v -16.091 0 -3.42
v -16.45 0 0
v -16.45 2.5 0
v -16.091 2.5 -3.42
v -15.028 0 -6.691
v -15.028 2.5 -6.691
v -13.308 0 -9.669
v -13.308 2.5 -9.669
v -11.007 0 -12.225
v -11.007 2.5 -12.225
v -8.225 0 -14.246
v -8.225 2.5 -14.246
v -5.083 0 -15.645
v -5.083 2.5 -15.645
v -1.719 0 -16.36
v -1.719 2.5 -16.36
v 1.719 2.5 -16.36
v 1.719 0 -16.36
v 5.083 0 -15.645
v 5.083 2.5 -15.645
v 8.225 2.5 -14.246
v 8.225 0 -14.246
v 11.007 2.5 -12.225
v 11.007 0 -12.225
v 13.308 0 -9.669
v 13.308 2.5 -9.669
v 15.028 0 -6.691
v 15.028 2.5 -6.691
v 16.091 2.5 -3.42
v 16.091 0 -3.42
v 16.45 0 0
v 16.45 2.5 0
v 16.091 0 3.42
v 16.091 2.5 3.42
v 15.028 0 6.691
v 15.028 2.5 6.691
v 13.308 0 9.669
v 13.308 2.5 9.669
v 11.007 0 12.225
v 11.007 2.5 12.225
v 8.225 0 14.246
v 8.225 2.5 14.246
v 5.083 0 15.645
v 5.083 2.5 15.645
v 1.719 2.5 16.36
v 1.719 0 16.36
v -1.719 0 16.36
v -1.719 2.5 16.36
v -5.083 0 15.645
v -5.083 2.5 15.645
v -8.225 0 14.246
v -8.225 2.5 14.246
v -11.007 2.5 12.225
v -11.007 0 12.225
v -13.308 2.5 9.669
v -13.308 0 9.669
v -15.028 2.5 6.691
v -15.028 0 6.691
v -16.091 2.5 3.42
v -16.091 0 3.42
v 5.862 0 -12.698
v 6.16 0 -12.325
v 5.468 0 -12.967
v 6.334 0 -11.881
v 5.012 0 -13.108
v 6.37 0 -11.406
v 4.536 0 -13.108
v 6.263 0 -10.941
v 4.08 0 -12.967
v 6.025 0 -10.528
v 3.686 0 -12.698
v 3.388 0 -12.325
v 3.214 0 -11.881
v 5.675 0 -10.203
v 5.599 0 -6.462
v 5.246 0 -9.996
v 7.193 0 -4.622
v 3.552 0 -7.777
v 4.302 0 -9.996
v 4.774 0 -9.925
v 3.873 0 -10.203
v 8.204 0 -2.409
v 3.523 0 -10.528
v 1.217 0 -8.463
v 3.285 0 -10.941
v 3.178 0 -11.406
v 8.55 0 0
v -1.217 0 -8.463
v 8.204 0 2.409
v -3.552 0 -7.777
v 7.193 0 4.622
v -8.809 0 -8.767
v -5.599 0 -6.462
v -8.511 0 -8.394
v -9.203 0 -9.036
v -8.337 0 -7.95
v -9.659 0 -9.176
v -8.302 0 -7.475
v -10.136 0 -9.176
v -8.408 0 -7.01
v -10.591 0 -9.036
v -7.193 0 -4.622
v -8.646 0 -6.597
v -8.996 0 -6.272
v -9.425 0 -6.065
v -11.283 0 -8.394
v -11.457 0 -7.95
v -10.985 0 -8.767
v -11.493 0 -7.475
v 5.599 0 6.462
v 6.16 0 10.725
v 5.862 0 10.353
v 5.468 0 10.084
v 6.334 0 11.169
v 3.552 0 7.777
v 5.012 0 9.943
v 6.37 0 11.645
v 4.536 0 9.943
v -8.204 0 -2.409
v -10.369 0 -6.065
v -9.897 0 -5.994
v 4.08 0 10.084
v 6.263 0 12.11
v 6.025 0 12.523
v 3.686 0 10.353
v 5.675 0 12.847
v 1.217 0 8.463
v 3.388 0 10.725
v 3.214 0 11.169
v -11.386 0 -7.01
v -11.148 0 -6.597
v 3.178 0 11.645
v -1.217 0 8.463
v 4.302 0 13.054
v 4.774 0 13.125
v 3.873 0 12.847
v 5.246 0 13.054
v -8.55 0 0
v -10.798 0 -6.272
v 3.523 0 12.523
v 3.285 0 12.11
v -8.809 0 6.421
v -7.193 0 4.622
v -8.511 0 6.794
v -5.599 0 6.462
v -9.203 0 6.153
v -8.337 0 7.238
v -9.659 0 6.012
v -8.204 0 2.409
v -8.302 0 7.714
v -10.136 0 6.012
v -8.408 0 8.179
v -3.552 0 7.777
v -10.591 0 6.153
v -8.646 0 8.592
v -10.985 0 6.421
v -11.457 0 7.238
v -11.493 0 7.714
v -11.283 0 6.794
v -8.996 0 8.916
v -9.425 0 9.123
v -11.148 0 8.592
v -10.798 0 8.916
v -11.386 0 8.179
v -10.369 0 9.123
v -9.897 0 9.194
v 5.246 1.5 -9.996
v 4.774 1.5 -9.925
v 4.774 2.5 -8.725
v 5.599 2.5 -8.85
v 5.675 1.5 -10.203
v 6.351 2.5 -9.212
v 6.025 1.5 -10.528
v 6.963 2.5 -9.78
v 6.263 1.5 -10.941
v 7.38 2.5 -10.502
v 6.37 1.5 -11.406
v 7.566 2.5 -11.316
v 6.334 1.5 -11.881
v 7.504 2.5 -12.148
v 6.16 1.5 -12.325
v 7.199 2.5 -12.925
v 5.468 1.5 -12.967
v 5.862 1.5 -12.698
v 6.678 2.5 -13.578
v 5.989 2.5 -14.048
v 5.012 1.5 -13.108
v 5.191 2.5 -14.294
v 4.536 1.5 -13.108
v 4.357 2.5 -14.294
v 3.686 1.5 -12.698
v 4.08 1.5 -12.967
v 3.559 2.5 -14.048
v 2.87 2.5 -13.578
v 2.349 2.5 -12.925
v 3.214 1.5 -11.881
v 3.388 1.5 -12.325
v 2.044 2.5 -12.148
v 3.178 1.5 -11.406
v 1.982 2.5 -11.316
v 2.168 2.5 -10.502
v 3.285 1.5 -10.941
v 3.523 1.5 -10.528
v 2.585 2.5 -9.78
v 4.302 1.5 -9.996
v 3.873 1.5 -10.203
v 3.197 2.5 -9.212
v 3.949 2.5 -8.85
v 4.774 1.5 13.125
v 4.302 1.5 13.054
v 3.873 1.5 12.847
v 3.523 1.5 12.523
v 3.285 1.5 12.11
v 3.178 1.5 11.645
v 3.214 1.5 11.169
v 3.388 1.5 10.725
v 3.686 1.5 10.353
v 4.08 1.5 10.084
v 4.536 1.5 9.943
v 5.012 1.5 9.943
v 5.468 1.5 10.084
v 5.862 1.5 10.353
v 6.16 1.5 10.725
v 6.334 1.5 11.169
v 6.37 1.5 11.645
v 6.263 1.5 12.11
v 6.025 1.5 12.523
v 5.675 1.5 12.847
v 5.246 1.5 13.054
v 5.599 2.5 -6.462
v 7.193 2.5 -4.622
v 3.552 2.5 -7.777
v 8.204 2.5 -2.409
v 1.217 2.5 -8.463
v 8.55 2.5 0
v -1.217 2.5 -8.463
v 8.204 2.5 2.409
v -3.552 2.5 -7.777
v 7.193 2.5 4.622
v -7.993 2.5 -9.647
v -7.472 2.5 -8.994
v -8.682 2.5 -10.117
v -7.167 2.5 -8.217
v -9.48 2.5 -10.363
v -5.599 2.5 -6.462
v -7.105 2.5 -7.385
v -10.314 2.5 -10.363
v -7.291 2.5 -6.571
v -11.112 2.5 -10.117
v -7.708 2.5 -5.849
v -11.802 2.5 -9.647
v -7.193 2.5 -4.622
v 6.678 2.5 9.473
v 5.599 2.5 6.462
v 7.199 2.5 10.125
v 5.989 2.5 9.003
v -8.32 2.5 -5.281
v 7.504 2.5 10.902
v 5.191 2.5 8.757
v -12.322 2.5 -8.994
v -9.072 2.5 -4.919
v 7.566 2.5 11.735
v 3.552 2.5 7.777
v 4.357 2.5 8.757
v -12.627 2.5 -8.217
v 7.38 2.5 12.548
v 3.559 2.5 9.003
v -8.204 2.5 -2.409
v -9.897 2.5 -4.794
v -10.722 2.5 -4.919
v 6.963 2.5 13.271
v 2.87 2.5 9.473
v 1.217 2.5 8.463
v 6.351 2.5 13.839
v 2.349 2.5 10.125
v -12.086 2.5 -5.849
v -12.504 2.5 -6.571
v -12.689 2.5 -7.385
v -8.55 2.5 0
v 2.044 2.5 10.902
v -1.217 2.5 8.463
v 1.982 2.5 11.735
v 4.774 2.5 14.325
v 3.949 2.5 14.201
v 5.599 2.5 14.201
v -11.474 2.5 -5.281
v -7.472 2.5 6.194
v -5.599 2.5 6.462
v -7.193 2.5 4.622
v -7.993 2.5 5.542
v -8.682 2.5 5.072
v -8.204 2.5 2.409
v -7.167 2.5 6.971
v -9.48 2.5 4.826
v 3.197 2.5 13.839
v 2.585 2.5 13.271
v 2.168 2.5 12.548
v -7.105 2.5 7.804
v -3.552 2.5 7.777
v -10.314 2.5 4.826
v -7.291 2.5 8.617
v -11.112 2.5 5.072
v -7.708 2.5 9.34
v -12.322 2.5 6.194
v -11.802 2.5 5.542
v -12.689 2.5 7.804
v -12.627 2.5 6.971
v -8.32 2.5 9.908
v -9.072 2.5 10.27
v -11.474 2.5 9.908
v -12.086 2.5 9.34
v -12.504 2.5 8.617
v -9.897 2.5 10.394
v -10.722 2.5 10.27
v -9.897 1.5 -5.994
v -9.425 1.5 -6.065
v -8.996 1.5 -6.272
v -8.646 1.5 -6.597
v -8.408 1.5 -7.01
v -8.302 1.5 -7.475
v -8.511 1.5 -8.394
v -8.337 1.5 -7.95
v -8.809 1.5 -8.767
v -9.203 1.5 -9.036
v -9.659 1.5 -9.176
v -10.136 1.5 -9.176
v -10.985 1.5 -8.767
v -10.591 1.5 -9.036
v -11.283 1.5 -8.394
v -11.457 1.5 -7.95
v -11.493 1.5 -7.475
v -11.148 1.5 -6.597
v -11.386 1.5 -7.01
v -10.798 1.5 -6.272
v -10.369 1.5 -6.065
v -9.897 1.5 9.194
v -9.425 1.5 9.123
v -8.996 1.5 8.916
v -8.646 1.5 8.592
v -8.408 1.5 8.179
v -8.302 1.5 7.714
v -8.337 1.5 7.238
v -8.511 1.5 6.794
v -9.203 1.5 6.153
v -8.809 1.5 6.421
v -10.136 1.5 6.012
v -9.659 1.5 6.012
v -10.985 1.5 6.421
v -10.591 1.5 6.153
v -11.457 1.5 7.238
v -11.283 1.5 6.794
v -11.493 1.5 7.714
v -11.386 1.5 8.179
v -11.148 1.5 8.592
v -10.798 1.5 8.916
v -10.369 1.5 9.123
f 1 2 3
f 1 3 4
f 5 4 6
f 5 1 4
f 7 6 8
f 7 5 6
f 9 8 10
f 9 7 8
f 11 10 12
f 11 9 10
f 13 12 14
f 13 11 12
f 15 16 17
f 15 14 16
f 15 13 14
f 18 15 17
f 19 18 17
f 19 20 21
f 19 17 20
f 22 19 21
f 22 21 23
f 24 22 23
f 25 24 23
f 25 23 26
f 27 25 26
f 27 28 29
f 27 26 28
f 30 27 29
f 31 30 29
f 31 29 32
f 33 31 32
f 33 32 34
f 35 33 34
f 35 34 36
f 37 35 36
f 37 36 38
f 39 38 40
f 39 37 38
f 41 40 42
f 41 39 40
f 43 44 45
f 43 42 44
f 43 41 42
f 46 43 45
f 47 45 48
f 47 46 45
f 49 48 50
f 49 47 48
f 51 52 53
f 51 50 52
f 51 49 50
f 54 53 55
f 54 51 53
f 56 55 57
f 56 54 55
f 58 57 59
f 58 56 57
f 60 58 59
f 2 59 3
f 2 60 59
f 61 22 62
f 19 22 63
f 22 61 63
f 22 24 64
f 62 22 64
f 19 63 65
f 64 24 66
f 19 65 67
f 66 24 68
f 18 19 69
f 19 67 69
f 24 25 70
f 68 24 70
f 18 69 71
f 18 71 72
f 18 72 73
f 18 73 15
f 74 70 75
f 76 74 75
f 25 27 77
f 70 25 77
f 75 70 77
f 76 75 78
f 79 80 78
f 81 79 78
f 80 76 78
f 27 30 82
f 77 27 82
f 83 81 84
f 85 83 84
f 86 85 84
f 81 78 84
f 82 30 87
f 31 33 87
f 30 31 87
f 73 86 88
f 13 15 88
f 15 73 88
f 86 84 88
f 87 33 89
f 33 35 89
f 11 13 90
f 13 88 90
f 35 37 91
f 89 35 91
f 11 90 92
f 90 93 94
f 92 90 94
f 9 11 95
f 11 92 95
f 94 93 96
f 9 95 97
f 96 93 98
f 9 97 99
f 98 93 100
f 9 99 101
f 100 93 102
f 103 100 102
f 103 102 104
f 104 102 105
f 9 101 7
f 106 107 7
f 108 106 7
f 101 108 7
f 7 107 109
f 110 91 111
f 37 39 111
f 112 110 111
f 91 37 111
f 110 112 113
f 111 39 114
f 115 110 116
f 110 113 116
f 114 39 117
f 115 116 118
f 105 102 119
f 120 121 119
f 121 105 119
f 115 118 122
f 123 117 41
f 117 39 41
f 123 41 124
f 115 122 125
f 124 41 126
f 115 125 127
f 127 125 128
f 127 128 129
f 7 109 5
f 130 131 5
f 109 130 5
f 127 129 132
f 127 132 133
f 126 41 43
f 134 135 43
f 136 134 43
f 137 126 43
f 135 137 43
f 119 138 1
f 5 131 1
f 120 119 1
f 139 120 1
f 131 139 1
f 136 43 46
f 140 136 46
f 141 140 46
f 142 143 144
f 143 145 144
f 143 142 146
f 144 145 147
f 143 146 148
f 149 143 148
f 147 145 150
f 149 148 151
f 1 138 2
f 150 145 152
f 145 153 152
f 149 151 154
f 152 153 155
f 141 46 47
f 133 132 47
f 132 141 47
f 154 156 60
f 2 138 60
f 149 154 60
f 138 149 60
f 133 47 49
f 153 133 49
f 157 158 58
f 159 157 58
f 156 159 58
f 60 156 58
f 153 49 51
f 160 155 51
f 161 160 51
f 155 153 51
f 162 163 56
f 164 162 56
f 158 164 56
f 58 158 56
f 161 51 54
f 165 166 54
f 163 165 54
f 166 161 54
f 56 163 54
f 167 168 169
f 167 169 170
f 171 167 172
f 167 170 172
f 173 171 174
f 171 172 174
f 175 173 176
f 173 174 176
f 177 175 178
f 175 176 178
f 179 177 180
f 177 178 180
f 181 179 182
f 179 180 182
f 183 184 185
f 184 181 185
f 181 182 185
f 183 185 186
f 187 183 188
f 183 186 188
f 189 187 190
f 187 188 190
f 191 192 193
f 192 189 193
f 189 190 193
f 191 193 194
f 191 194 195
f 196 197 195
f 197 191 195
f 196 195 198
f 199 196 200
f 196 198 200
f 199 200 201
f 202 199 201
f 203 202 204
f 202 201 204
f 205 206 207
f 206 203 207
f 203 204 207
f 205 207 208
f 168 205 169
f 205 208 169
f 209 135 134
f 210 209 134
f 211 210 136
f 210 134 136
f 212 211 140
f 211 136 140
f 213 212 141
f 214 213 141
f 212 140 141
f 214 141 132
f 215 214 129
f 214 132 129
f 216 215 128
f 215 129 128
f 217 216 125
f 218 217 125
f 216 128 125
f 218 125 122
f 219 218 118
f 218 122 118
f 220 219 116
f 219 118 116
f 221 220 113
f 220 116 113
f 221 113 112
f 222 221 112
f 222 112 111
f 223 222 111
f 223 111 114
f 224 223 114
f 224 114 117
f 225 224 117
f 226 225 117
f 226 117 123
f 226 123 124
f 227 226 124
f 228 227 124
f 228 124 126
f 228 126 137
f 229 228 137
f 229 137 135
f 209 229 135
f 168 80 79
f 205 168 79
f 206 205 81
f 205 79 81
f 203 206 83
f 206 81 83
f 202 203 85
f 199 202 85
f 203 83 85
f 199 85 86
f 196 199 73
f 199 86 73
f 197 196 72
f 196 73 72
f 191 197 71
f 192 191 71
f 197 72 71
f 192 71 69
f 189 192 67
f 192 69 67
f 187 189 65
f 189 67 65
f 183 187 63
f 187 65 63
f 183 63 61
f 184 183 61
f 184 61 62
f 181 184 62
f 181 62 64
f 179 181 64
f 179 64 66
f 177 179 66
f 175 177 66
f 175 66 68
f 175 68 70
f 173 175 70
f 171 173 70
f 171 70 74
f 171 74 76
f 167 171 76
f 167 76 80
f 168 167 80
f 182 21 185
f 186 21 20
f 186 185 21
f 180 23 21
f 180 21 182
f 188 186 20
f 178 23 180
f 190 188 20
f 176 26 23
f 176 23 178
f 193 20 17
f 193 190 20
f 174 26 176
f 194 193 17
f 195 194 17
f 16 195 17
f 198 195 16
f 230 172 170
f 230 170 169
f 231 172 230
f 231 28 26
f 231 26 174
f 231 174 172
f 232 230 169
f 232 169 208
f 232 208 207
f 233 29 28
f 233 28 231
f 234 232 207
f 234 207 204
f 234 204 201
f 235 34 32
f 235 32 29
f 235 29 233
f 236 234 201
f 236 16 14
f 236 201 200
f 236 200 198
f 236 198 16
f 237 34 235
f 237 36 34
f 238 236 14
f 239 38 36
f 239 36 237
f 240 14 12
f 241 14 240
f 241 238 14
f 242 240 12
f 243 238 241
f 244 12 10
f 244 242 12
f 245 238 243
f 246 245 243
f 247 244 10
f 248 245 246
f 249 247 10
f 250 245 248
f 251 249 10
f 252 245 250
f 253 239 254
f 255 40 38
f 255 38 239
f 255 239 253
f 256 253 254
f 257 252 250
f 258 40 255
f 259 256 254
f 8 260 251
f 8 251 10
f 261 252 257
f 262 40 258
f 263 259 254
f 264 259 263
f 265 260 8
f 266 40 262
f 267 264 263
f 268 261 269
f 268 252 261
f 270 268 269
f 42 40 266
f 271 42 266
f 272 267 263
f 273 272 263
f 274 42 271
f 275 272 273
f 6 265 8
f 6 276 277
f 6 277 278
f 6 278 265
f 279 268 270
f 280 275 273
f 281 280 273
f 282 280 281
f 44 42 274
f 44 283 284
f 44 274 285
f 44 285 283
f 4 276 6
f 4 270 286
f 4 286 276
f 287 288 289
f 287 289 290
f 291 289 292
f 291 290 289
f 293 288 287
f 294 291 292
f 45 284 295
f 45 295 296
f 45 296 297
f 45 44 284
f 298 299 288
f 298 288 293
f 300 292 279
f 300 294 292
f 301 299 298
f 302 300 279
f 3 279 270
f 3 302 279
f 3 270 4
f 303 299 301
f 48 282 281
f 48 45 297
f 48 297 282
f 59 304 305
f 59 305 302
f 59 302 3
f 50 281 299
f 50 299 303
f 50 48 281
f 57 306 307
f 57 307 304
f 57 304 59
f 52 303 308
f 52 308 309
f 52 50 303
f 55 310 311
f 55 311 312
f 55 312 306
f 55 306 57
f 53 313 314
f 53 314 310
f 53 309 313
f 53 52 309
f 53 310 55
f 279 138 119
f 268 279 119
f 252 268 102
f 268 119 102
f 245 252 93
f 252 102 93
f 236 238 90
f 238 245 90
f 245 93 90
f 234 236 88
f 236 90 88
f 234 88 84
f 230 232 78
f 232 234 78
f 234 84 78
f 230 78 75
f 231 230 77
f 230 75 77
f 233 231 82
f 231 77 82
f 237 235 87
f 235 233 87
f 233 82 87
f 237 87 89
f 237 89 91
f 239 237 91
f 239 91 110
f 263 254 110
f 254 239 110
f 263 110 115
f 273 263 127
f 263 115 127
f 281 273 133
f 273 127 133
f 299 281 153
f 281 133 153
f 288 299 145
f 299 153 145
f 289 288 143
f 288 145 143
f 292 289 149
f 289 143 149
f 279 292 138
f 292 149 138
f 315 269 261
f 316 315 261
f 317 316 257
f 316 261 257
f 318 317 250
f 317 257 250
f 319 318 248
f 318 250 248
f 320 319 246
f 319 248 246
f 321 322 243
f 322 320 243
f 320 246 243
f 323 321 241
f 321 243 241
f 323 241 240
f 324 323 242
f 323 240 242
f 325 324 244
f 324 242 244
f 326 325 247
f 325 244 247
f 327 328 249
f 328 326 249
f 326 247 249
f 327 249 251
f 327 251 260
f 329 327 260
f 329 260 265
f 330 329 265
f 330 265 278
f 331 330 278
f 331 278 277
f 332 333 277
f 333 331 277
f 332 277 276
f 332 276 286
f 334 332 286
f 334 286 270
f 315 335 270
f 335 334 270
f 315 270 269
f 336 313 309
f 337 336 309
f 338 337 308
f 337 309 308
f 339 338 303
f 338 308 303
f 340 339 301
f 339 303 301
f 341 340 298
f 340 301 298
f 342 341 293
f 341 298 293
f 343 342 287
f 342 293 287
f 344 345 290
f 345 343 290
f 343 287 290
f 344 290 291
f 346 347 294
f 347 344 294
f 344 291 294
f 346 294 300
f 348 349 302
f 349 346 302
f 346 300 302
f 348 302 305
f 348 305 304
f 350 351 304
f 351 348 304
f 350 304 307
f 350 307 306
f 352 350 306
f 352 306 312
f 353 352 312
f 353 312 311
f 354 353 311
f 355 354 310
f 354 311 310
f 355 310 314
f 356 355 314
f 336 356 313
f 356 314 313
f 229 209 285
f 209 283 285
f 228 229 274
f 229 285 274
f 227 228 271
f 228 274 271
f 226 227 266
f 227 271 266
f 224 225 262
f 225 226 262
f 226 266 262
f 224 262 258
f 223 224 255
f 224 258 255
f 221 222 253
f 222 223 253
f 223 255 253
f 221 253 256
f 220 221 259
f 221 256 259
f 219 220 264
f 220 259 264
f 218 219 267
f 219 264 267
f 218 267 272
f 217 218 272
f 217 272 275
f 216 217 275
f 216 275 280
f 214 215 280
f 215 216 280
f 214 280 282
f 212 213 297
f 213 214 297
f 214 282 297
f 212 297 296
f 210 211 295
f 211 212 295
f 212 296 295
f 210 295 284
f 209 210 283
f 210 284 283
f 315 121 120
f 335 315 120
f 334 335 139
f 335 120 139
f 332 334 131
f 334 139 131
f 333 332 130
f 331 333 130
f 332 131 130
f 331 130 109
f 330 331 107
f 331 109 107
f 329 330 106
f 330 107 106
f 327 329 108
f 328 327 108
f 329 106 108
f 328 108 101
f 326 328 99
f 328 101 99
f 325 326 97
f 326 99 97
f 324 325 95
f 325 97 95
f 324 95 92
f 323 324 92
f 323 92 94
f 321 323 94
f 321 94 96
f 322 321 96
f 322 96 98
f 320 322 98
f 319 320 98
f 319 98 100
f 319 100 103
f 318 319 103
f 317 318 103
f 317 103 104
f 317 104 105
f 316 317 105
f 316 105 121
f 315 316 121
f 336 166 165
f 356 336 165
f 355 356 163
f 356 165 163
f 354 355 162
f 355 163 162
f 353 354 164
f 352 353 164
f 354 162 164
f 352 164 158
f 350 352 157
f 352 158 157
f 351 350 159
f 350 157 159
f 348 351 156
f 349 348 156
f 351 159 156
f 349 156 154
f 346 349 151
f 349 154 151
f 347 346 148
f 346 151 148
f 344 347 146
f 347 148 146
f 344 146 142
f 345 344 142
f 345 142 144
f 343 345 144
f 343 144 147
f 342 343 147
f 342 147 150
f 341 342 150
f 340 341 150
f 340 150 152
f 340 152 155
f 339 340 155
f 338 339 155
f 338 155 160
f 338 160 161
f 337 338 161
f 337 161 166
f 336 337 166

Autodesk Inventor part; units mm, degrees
ref_plane "YZ Plane" through (0, 0, 0) normal (1, 0, 0) x (0, 1, 0)
ref_plane "XZ Plane" through (0, 0, 0) normal (0, 1, 0) x (-1, 0, 0)
ref_plane "XY Plane" through (0, 0, 0) normal (0, 0, 1) x (1, 0, 0)
sketch "Sketch1" plane through (0, 0, 0) normal (0, 1, 0) x (-1, 0, 0)
  circle A0 centre (0, 0) radius 16.45
  circle A1 centre (0, 0) radius 8.55
  dimension "d0" = 32.9
  dimension "d1" = 17.1
extrude "Extrusion1" add sketch "Sketch1" along normal blind 2.5
sketch "Sketch2" plane through (0, 2.5, 0) normal (0, 1, 0) x (1, 0, 0)
  circle A0 centre (0, 0) radius 12.475
  line L0 (0, 0) -> (4.774, -11.5254)
  line L1 (0, 0) -> (21.8352, 0) construction
  line L2 (0, 0) -> (4.774, 11.5254)
  line L3 (0, 0) -> (76.5, 0) construction
  point P0 (-9.8971, -7.5943)
  point P1 (-9.8971, 7.5943)
  point P2 (4.774, 11.5254)
  dimension "d4" = 24.95
  dimension "d5" = 67.5
  dimension "d7" = 67.5
  dimension "d10" = 225
hole "Hole1" at (4.774, 2.5, 11.5254) at (-9.8971, 2.5, 7.5943) at (-9.8971, 2.5, -7.5943) at (4.774, 2.5, -11.5254) direction (0, -1, 0) diameter 3.2 depth 4 tip angle 118
chamfer "Chamfer1" distance 1.2 distance2 1 4 edges at (4.774, 2.5, -13.1254) (-9.8971, 2.5, -9.1943) (4.774, 2.5, 9.9254) (-9.8971, 2.5, 5.9943) measured on face at (-5.8151, 2.5, -10.6262)
properties part number "Simple_Mouting_Bracket"
